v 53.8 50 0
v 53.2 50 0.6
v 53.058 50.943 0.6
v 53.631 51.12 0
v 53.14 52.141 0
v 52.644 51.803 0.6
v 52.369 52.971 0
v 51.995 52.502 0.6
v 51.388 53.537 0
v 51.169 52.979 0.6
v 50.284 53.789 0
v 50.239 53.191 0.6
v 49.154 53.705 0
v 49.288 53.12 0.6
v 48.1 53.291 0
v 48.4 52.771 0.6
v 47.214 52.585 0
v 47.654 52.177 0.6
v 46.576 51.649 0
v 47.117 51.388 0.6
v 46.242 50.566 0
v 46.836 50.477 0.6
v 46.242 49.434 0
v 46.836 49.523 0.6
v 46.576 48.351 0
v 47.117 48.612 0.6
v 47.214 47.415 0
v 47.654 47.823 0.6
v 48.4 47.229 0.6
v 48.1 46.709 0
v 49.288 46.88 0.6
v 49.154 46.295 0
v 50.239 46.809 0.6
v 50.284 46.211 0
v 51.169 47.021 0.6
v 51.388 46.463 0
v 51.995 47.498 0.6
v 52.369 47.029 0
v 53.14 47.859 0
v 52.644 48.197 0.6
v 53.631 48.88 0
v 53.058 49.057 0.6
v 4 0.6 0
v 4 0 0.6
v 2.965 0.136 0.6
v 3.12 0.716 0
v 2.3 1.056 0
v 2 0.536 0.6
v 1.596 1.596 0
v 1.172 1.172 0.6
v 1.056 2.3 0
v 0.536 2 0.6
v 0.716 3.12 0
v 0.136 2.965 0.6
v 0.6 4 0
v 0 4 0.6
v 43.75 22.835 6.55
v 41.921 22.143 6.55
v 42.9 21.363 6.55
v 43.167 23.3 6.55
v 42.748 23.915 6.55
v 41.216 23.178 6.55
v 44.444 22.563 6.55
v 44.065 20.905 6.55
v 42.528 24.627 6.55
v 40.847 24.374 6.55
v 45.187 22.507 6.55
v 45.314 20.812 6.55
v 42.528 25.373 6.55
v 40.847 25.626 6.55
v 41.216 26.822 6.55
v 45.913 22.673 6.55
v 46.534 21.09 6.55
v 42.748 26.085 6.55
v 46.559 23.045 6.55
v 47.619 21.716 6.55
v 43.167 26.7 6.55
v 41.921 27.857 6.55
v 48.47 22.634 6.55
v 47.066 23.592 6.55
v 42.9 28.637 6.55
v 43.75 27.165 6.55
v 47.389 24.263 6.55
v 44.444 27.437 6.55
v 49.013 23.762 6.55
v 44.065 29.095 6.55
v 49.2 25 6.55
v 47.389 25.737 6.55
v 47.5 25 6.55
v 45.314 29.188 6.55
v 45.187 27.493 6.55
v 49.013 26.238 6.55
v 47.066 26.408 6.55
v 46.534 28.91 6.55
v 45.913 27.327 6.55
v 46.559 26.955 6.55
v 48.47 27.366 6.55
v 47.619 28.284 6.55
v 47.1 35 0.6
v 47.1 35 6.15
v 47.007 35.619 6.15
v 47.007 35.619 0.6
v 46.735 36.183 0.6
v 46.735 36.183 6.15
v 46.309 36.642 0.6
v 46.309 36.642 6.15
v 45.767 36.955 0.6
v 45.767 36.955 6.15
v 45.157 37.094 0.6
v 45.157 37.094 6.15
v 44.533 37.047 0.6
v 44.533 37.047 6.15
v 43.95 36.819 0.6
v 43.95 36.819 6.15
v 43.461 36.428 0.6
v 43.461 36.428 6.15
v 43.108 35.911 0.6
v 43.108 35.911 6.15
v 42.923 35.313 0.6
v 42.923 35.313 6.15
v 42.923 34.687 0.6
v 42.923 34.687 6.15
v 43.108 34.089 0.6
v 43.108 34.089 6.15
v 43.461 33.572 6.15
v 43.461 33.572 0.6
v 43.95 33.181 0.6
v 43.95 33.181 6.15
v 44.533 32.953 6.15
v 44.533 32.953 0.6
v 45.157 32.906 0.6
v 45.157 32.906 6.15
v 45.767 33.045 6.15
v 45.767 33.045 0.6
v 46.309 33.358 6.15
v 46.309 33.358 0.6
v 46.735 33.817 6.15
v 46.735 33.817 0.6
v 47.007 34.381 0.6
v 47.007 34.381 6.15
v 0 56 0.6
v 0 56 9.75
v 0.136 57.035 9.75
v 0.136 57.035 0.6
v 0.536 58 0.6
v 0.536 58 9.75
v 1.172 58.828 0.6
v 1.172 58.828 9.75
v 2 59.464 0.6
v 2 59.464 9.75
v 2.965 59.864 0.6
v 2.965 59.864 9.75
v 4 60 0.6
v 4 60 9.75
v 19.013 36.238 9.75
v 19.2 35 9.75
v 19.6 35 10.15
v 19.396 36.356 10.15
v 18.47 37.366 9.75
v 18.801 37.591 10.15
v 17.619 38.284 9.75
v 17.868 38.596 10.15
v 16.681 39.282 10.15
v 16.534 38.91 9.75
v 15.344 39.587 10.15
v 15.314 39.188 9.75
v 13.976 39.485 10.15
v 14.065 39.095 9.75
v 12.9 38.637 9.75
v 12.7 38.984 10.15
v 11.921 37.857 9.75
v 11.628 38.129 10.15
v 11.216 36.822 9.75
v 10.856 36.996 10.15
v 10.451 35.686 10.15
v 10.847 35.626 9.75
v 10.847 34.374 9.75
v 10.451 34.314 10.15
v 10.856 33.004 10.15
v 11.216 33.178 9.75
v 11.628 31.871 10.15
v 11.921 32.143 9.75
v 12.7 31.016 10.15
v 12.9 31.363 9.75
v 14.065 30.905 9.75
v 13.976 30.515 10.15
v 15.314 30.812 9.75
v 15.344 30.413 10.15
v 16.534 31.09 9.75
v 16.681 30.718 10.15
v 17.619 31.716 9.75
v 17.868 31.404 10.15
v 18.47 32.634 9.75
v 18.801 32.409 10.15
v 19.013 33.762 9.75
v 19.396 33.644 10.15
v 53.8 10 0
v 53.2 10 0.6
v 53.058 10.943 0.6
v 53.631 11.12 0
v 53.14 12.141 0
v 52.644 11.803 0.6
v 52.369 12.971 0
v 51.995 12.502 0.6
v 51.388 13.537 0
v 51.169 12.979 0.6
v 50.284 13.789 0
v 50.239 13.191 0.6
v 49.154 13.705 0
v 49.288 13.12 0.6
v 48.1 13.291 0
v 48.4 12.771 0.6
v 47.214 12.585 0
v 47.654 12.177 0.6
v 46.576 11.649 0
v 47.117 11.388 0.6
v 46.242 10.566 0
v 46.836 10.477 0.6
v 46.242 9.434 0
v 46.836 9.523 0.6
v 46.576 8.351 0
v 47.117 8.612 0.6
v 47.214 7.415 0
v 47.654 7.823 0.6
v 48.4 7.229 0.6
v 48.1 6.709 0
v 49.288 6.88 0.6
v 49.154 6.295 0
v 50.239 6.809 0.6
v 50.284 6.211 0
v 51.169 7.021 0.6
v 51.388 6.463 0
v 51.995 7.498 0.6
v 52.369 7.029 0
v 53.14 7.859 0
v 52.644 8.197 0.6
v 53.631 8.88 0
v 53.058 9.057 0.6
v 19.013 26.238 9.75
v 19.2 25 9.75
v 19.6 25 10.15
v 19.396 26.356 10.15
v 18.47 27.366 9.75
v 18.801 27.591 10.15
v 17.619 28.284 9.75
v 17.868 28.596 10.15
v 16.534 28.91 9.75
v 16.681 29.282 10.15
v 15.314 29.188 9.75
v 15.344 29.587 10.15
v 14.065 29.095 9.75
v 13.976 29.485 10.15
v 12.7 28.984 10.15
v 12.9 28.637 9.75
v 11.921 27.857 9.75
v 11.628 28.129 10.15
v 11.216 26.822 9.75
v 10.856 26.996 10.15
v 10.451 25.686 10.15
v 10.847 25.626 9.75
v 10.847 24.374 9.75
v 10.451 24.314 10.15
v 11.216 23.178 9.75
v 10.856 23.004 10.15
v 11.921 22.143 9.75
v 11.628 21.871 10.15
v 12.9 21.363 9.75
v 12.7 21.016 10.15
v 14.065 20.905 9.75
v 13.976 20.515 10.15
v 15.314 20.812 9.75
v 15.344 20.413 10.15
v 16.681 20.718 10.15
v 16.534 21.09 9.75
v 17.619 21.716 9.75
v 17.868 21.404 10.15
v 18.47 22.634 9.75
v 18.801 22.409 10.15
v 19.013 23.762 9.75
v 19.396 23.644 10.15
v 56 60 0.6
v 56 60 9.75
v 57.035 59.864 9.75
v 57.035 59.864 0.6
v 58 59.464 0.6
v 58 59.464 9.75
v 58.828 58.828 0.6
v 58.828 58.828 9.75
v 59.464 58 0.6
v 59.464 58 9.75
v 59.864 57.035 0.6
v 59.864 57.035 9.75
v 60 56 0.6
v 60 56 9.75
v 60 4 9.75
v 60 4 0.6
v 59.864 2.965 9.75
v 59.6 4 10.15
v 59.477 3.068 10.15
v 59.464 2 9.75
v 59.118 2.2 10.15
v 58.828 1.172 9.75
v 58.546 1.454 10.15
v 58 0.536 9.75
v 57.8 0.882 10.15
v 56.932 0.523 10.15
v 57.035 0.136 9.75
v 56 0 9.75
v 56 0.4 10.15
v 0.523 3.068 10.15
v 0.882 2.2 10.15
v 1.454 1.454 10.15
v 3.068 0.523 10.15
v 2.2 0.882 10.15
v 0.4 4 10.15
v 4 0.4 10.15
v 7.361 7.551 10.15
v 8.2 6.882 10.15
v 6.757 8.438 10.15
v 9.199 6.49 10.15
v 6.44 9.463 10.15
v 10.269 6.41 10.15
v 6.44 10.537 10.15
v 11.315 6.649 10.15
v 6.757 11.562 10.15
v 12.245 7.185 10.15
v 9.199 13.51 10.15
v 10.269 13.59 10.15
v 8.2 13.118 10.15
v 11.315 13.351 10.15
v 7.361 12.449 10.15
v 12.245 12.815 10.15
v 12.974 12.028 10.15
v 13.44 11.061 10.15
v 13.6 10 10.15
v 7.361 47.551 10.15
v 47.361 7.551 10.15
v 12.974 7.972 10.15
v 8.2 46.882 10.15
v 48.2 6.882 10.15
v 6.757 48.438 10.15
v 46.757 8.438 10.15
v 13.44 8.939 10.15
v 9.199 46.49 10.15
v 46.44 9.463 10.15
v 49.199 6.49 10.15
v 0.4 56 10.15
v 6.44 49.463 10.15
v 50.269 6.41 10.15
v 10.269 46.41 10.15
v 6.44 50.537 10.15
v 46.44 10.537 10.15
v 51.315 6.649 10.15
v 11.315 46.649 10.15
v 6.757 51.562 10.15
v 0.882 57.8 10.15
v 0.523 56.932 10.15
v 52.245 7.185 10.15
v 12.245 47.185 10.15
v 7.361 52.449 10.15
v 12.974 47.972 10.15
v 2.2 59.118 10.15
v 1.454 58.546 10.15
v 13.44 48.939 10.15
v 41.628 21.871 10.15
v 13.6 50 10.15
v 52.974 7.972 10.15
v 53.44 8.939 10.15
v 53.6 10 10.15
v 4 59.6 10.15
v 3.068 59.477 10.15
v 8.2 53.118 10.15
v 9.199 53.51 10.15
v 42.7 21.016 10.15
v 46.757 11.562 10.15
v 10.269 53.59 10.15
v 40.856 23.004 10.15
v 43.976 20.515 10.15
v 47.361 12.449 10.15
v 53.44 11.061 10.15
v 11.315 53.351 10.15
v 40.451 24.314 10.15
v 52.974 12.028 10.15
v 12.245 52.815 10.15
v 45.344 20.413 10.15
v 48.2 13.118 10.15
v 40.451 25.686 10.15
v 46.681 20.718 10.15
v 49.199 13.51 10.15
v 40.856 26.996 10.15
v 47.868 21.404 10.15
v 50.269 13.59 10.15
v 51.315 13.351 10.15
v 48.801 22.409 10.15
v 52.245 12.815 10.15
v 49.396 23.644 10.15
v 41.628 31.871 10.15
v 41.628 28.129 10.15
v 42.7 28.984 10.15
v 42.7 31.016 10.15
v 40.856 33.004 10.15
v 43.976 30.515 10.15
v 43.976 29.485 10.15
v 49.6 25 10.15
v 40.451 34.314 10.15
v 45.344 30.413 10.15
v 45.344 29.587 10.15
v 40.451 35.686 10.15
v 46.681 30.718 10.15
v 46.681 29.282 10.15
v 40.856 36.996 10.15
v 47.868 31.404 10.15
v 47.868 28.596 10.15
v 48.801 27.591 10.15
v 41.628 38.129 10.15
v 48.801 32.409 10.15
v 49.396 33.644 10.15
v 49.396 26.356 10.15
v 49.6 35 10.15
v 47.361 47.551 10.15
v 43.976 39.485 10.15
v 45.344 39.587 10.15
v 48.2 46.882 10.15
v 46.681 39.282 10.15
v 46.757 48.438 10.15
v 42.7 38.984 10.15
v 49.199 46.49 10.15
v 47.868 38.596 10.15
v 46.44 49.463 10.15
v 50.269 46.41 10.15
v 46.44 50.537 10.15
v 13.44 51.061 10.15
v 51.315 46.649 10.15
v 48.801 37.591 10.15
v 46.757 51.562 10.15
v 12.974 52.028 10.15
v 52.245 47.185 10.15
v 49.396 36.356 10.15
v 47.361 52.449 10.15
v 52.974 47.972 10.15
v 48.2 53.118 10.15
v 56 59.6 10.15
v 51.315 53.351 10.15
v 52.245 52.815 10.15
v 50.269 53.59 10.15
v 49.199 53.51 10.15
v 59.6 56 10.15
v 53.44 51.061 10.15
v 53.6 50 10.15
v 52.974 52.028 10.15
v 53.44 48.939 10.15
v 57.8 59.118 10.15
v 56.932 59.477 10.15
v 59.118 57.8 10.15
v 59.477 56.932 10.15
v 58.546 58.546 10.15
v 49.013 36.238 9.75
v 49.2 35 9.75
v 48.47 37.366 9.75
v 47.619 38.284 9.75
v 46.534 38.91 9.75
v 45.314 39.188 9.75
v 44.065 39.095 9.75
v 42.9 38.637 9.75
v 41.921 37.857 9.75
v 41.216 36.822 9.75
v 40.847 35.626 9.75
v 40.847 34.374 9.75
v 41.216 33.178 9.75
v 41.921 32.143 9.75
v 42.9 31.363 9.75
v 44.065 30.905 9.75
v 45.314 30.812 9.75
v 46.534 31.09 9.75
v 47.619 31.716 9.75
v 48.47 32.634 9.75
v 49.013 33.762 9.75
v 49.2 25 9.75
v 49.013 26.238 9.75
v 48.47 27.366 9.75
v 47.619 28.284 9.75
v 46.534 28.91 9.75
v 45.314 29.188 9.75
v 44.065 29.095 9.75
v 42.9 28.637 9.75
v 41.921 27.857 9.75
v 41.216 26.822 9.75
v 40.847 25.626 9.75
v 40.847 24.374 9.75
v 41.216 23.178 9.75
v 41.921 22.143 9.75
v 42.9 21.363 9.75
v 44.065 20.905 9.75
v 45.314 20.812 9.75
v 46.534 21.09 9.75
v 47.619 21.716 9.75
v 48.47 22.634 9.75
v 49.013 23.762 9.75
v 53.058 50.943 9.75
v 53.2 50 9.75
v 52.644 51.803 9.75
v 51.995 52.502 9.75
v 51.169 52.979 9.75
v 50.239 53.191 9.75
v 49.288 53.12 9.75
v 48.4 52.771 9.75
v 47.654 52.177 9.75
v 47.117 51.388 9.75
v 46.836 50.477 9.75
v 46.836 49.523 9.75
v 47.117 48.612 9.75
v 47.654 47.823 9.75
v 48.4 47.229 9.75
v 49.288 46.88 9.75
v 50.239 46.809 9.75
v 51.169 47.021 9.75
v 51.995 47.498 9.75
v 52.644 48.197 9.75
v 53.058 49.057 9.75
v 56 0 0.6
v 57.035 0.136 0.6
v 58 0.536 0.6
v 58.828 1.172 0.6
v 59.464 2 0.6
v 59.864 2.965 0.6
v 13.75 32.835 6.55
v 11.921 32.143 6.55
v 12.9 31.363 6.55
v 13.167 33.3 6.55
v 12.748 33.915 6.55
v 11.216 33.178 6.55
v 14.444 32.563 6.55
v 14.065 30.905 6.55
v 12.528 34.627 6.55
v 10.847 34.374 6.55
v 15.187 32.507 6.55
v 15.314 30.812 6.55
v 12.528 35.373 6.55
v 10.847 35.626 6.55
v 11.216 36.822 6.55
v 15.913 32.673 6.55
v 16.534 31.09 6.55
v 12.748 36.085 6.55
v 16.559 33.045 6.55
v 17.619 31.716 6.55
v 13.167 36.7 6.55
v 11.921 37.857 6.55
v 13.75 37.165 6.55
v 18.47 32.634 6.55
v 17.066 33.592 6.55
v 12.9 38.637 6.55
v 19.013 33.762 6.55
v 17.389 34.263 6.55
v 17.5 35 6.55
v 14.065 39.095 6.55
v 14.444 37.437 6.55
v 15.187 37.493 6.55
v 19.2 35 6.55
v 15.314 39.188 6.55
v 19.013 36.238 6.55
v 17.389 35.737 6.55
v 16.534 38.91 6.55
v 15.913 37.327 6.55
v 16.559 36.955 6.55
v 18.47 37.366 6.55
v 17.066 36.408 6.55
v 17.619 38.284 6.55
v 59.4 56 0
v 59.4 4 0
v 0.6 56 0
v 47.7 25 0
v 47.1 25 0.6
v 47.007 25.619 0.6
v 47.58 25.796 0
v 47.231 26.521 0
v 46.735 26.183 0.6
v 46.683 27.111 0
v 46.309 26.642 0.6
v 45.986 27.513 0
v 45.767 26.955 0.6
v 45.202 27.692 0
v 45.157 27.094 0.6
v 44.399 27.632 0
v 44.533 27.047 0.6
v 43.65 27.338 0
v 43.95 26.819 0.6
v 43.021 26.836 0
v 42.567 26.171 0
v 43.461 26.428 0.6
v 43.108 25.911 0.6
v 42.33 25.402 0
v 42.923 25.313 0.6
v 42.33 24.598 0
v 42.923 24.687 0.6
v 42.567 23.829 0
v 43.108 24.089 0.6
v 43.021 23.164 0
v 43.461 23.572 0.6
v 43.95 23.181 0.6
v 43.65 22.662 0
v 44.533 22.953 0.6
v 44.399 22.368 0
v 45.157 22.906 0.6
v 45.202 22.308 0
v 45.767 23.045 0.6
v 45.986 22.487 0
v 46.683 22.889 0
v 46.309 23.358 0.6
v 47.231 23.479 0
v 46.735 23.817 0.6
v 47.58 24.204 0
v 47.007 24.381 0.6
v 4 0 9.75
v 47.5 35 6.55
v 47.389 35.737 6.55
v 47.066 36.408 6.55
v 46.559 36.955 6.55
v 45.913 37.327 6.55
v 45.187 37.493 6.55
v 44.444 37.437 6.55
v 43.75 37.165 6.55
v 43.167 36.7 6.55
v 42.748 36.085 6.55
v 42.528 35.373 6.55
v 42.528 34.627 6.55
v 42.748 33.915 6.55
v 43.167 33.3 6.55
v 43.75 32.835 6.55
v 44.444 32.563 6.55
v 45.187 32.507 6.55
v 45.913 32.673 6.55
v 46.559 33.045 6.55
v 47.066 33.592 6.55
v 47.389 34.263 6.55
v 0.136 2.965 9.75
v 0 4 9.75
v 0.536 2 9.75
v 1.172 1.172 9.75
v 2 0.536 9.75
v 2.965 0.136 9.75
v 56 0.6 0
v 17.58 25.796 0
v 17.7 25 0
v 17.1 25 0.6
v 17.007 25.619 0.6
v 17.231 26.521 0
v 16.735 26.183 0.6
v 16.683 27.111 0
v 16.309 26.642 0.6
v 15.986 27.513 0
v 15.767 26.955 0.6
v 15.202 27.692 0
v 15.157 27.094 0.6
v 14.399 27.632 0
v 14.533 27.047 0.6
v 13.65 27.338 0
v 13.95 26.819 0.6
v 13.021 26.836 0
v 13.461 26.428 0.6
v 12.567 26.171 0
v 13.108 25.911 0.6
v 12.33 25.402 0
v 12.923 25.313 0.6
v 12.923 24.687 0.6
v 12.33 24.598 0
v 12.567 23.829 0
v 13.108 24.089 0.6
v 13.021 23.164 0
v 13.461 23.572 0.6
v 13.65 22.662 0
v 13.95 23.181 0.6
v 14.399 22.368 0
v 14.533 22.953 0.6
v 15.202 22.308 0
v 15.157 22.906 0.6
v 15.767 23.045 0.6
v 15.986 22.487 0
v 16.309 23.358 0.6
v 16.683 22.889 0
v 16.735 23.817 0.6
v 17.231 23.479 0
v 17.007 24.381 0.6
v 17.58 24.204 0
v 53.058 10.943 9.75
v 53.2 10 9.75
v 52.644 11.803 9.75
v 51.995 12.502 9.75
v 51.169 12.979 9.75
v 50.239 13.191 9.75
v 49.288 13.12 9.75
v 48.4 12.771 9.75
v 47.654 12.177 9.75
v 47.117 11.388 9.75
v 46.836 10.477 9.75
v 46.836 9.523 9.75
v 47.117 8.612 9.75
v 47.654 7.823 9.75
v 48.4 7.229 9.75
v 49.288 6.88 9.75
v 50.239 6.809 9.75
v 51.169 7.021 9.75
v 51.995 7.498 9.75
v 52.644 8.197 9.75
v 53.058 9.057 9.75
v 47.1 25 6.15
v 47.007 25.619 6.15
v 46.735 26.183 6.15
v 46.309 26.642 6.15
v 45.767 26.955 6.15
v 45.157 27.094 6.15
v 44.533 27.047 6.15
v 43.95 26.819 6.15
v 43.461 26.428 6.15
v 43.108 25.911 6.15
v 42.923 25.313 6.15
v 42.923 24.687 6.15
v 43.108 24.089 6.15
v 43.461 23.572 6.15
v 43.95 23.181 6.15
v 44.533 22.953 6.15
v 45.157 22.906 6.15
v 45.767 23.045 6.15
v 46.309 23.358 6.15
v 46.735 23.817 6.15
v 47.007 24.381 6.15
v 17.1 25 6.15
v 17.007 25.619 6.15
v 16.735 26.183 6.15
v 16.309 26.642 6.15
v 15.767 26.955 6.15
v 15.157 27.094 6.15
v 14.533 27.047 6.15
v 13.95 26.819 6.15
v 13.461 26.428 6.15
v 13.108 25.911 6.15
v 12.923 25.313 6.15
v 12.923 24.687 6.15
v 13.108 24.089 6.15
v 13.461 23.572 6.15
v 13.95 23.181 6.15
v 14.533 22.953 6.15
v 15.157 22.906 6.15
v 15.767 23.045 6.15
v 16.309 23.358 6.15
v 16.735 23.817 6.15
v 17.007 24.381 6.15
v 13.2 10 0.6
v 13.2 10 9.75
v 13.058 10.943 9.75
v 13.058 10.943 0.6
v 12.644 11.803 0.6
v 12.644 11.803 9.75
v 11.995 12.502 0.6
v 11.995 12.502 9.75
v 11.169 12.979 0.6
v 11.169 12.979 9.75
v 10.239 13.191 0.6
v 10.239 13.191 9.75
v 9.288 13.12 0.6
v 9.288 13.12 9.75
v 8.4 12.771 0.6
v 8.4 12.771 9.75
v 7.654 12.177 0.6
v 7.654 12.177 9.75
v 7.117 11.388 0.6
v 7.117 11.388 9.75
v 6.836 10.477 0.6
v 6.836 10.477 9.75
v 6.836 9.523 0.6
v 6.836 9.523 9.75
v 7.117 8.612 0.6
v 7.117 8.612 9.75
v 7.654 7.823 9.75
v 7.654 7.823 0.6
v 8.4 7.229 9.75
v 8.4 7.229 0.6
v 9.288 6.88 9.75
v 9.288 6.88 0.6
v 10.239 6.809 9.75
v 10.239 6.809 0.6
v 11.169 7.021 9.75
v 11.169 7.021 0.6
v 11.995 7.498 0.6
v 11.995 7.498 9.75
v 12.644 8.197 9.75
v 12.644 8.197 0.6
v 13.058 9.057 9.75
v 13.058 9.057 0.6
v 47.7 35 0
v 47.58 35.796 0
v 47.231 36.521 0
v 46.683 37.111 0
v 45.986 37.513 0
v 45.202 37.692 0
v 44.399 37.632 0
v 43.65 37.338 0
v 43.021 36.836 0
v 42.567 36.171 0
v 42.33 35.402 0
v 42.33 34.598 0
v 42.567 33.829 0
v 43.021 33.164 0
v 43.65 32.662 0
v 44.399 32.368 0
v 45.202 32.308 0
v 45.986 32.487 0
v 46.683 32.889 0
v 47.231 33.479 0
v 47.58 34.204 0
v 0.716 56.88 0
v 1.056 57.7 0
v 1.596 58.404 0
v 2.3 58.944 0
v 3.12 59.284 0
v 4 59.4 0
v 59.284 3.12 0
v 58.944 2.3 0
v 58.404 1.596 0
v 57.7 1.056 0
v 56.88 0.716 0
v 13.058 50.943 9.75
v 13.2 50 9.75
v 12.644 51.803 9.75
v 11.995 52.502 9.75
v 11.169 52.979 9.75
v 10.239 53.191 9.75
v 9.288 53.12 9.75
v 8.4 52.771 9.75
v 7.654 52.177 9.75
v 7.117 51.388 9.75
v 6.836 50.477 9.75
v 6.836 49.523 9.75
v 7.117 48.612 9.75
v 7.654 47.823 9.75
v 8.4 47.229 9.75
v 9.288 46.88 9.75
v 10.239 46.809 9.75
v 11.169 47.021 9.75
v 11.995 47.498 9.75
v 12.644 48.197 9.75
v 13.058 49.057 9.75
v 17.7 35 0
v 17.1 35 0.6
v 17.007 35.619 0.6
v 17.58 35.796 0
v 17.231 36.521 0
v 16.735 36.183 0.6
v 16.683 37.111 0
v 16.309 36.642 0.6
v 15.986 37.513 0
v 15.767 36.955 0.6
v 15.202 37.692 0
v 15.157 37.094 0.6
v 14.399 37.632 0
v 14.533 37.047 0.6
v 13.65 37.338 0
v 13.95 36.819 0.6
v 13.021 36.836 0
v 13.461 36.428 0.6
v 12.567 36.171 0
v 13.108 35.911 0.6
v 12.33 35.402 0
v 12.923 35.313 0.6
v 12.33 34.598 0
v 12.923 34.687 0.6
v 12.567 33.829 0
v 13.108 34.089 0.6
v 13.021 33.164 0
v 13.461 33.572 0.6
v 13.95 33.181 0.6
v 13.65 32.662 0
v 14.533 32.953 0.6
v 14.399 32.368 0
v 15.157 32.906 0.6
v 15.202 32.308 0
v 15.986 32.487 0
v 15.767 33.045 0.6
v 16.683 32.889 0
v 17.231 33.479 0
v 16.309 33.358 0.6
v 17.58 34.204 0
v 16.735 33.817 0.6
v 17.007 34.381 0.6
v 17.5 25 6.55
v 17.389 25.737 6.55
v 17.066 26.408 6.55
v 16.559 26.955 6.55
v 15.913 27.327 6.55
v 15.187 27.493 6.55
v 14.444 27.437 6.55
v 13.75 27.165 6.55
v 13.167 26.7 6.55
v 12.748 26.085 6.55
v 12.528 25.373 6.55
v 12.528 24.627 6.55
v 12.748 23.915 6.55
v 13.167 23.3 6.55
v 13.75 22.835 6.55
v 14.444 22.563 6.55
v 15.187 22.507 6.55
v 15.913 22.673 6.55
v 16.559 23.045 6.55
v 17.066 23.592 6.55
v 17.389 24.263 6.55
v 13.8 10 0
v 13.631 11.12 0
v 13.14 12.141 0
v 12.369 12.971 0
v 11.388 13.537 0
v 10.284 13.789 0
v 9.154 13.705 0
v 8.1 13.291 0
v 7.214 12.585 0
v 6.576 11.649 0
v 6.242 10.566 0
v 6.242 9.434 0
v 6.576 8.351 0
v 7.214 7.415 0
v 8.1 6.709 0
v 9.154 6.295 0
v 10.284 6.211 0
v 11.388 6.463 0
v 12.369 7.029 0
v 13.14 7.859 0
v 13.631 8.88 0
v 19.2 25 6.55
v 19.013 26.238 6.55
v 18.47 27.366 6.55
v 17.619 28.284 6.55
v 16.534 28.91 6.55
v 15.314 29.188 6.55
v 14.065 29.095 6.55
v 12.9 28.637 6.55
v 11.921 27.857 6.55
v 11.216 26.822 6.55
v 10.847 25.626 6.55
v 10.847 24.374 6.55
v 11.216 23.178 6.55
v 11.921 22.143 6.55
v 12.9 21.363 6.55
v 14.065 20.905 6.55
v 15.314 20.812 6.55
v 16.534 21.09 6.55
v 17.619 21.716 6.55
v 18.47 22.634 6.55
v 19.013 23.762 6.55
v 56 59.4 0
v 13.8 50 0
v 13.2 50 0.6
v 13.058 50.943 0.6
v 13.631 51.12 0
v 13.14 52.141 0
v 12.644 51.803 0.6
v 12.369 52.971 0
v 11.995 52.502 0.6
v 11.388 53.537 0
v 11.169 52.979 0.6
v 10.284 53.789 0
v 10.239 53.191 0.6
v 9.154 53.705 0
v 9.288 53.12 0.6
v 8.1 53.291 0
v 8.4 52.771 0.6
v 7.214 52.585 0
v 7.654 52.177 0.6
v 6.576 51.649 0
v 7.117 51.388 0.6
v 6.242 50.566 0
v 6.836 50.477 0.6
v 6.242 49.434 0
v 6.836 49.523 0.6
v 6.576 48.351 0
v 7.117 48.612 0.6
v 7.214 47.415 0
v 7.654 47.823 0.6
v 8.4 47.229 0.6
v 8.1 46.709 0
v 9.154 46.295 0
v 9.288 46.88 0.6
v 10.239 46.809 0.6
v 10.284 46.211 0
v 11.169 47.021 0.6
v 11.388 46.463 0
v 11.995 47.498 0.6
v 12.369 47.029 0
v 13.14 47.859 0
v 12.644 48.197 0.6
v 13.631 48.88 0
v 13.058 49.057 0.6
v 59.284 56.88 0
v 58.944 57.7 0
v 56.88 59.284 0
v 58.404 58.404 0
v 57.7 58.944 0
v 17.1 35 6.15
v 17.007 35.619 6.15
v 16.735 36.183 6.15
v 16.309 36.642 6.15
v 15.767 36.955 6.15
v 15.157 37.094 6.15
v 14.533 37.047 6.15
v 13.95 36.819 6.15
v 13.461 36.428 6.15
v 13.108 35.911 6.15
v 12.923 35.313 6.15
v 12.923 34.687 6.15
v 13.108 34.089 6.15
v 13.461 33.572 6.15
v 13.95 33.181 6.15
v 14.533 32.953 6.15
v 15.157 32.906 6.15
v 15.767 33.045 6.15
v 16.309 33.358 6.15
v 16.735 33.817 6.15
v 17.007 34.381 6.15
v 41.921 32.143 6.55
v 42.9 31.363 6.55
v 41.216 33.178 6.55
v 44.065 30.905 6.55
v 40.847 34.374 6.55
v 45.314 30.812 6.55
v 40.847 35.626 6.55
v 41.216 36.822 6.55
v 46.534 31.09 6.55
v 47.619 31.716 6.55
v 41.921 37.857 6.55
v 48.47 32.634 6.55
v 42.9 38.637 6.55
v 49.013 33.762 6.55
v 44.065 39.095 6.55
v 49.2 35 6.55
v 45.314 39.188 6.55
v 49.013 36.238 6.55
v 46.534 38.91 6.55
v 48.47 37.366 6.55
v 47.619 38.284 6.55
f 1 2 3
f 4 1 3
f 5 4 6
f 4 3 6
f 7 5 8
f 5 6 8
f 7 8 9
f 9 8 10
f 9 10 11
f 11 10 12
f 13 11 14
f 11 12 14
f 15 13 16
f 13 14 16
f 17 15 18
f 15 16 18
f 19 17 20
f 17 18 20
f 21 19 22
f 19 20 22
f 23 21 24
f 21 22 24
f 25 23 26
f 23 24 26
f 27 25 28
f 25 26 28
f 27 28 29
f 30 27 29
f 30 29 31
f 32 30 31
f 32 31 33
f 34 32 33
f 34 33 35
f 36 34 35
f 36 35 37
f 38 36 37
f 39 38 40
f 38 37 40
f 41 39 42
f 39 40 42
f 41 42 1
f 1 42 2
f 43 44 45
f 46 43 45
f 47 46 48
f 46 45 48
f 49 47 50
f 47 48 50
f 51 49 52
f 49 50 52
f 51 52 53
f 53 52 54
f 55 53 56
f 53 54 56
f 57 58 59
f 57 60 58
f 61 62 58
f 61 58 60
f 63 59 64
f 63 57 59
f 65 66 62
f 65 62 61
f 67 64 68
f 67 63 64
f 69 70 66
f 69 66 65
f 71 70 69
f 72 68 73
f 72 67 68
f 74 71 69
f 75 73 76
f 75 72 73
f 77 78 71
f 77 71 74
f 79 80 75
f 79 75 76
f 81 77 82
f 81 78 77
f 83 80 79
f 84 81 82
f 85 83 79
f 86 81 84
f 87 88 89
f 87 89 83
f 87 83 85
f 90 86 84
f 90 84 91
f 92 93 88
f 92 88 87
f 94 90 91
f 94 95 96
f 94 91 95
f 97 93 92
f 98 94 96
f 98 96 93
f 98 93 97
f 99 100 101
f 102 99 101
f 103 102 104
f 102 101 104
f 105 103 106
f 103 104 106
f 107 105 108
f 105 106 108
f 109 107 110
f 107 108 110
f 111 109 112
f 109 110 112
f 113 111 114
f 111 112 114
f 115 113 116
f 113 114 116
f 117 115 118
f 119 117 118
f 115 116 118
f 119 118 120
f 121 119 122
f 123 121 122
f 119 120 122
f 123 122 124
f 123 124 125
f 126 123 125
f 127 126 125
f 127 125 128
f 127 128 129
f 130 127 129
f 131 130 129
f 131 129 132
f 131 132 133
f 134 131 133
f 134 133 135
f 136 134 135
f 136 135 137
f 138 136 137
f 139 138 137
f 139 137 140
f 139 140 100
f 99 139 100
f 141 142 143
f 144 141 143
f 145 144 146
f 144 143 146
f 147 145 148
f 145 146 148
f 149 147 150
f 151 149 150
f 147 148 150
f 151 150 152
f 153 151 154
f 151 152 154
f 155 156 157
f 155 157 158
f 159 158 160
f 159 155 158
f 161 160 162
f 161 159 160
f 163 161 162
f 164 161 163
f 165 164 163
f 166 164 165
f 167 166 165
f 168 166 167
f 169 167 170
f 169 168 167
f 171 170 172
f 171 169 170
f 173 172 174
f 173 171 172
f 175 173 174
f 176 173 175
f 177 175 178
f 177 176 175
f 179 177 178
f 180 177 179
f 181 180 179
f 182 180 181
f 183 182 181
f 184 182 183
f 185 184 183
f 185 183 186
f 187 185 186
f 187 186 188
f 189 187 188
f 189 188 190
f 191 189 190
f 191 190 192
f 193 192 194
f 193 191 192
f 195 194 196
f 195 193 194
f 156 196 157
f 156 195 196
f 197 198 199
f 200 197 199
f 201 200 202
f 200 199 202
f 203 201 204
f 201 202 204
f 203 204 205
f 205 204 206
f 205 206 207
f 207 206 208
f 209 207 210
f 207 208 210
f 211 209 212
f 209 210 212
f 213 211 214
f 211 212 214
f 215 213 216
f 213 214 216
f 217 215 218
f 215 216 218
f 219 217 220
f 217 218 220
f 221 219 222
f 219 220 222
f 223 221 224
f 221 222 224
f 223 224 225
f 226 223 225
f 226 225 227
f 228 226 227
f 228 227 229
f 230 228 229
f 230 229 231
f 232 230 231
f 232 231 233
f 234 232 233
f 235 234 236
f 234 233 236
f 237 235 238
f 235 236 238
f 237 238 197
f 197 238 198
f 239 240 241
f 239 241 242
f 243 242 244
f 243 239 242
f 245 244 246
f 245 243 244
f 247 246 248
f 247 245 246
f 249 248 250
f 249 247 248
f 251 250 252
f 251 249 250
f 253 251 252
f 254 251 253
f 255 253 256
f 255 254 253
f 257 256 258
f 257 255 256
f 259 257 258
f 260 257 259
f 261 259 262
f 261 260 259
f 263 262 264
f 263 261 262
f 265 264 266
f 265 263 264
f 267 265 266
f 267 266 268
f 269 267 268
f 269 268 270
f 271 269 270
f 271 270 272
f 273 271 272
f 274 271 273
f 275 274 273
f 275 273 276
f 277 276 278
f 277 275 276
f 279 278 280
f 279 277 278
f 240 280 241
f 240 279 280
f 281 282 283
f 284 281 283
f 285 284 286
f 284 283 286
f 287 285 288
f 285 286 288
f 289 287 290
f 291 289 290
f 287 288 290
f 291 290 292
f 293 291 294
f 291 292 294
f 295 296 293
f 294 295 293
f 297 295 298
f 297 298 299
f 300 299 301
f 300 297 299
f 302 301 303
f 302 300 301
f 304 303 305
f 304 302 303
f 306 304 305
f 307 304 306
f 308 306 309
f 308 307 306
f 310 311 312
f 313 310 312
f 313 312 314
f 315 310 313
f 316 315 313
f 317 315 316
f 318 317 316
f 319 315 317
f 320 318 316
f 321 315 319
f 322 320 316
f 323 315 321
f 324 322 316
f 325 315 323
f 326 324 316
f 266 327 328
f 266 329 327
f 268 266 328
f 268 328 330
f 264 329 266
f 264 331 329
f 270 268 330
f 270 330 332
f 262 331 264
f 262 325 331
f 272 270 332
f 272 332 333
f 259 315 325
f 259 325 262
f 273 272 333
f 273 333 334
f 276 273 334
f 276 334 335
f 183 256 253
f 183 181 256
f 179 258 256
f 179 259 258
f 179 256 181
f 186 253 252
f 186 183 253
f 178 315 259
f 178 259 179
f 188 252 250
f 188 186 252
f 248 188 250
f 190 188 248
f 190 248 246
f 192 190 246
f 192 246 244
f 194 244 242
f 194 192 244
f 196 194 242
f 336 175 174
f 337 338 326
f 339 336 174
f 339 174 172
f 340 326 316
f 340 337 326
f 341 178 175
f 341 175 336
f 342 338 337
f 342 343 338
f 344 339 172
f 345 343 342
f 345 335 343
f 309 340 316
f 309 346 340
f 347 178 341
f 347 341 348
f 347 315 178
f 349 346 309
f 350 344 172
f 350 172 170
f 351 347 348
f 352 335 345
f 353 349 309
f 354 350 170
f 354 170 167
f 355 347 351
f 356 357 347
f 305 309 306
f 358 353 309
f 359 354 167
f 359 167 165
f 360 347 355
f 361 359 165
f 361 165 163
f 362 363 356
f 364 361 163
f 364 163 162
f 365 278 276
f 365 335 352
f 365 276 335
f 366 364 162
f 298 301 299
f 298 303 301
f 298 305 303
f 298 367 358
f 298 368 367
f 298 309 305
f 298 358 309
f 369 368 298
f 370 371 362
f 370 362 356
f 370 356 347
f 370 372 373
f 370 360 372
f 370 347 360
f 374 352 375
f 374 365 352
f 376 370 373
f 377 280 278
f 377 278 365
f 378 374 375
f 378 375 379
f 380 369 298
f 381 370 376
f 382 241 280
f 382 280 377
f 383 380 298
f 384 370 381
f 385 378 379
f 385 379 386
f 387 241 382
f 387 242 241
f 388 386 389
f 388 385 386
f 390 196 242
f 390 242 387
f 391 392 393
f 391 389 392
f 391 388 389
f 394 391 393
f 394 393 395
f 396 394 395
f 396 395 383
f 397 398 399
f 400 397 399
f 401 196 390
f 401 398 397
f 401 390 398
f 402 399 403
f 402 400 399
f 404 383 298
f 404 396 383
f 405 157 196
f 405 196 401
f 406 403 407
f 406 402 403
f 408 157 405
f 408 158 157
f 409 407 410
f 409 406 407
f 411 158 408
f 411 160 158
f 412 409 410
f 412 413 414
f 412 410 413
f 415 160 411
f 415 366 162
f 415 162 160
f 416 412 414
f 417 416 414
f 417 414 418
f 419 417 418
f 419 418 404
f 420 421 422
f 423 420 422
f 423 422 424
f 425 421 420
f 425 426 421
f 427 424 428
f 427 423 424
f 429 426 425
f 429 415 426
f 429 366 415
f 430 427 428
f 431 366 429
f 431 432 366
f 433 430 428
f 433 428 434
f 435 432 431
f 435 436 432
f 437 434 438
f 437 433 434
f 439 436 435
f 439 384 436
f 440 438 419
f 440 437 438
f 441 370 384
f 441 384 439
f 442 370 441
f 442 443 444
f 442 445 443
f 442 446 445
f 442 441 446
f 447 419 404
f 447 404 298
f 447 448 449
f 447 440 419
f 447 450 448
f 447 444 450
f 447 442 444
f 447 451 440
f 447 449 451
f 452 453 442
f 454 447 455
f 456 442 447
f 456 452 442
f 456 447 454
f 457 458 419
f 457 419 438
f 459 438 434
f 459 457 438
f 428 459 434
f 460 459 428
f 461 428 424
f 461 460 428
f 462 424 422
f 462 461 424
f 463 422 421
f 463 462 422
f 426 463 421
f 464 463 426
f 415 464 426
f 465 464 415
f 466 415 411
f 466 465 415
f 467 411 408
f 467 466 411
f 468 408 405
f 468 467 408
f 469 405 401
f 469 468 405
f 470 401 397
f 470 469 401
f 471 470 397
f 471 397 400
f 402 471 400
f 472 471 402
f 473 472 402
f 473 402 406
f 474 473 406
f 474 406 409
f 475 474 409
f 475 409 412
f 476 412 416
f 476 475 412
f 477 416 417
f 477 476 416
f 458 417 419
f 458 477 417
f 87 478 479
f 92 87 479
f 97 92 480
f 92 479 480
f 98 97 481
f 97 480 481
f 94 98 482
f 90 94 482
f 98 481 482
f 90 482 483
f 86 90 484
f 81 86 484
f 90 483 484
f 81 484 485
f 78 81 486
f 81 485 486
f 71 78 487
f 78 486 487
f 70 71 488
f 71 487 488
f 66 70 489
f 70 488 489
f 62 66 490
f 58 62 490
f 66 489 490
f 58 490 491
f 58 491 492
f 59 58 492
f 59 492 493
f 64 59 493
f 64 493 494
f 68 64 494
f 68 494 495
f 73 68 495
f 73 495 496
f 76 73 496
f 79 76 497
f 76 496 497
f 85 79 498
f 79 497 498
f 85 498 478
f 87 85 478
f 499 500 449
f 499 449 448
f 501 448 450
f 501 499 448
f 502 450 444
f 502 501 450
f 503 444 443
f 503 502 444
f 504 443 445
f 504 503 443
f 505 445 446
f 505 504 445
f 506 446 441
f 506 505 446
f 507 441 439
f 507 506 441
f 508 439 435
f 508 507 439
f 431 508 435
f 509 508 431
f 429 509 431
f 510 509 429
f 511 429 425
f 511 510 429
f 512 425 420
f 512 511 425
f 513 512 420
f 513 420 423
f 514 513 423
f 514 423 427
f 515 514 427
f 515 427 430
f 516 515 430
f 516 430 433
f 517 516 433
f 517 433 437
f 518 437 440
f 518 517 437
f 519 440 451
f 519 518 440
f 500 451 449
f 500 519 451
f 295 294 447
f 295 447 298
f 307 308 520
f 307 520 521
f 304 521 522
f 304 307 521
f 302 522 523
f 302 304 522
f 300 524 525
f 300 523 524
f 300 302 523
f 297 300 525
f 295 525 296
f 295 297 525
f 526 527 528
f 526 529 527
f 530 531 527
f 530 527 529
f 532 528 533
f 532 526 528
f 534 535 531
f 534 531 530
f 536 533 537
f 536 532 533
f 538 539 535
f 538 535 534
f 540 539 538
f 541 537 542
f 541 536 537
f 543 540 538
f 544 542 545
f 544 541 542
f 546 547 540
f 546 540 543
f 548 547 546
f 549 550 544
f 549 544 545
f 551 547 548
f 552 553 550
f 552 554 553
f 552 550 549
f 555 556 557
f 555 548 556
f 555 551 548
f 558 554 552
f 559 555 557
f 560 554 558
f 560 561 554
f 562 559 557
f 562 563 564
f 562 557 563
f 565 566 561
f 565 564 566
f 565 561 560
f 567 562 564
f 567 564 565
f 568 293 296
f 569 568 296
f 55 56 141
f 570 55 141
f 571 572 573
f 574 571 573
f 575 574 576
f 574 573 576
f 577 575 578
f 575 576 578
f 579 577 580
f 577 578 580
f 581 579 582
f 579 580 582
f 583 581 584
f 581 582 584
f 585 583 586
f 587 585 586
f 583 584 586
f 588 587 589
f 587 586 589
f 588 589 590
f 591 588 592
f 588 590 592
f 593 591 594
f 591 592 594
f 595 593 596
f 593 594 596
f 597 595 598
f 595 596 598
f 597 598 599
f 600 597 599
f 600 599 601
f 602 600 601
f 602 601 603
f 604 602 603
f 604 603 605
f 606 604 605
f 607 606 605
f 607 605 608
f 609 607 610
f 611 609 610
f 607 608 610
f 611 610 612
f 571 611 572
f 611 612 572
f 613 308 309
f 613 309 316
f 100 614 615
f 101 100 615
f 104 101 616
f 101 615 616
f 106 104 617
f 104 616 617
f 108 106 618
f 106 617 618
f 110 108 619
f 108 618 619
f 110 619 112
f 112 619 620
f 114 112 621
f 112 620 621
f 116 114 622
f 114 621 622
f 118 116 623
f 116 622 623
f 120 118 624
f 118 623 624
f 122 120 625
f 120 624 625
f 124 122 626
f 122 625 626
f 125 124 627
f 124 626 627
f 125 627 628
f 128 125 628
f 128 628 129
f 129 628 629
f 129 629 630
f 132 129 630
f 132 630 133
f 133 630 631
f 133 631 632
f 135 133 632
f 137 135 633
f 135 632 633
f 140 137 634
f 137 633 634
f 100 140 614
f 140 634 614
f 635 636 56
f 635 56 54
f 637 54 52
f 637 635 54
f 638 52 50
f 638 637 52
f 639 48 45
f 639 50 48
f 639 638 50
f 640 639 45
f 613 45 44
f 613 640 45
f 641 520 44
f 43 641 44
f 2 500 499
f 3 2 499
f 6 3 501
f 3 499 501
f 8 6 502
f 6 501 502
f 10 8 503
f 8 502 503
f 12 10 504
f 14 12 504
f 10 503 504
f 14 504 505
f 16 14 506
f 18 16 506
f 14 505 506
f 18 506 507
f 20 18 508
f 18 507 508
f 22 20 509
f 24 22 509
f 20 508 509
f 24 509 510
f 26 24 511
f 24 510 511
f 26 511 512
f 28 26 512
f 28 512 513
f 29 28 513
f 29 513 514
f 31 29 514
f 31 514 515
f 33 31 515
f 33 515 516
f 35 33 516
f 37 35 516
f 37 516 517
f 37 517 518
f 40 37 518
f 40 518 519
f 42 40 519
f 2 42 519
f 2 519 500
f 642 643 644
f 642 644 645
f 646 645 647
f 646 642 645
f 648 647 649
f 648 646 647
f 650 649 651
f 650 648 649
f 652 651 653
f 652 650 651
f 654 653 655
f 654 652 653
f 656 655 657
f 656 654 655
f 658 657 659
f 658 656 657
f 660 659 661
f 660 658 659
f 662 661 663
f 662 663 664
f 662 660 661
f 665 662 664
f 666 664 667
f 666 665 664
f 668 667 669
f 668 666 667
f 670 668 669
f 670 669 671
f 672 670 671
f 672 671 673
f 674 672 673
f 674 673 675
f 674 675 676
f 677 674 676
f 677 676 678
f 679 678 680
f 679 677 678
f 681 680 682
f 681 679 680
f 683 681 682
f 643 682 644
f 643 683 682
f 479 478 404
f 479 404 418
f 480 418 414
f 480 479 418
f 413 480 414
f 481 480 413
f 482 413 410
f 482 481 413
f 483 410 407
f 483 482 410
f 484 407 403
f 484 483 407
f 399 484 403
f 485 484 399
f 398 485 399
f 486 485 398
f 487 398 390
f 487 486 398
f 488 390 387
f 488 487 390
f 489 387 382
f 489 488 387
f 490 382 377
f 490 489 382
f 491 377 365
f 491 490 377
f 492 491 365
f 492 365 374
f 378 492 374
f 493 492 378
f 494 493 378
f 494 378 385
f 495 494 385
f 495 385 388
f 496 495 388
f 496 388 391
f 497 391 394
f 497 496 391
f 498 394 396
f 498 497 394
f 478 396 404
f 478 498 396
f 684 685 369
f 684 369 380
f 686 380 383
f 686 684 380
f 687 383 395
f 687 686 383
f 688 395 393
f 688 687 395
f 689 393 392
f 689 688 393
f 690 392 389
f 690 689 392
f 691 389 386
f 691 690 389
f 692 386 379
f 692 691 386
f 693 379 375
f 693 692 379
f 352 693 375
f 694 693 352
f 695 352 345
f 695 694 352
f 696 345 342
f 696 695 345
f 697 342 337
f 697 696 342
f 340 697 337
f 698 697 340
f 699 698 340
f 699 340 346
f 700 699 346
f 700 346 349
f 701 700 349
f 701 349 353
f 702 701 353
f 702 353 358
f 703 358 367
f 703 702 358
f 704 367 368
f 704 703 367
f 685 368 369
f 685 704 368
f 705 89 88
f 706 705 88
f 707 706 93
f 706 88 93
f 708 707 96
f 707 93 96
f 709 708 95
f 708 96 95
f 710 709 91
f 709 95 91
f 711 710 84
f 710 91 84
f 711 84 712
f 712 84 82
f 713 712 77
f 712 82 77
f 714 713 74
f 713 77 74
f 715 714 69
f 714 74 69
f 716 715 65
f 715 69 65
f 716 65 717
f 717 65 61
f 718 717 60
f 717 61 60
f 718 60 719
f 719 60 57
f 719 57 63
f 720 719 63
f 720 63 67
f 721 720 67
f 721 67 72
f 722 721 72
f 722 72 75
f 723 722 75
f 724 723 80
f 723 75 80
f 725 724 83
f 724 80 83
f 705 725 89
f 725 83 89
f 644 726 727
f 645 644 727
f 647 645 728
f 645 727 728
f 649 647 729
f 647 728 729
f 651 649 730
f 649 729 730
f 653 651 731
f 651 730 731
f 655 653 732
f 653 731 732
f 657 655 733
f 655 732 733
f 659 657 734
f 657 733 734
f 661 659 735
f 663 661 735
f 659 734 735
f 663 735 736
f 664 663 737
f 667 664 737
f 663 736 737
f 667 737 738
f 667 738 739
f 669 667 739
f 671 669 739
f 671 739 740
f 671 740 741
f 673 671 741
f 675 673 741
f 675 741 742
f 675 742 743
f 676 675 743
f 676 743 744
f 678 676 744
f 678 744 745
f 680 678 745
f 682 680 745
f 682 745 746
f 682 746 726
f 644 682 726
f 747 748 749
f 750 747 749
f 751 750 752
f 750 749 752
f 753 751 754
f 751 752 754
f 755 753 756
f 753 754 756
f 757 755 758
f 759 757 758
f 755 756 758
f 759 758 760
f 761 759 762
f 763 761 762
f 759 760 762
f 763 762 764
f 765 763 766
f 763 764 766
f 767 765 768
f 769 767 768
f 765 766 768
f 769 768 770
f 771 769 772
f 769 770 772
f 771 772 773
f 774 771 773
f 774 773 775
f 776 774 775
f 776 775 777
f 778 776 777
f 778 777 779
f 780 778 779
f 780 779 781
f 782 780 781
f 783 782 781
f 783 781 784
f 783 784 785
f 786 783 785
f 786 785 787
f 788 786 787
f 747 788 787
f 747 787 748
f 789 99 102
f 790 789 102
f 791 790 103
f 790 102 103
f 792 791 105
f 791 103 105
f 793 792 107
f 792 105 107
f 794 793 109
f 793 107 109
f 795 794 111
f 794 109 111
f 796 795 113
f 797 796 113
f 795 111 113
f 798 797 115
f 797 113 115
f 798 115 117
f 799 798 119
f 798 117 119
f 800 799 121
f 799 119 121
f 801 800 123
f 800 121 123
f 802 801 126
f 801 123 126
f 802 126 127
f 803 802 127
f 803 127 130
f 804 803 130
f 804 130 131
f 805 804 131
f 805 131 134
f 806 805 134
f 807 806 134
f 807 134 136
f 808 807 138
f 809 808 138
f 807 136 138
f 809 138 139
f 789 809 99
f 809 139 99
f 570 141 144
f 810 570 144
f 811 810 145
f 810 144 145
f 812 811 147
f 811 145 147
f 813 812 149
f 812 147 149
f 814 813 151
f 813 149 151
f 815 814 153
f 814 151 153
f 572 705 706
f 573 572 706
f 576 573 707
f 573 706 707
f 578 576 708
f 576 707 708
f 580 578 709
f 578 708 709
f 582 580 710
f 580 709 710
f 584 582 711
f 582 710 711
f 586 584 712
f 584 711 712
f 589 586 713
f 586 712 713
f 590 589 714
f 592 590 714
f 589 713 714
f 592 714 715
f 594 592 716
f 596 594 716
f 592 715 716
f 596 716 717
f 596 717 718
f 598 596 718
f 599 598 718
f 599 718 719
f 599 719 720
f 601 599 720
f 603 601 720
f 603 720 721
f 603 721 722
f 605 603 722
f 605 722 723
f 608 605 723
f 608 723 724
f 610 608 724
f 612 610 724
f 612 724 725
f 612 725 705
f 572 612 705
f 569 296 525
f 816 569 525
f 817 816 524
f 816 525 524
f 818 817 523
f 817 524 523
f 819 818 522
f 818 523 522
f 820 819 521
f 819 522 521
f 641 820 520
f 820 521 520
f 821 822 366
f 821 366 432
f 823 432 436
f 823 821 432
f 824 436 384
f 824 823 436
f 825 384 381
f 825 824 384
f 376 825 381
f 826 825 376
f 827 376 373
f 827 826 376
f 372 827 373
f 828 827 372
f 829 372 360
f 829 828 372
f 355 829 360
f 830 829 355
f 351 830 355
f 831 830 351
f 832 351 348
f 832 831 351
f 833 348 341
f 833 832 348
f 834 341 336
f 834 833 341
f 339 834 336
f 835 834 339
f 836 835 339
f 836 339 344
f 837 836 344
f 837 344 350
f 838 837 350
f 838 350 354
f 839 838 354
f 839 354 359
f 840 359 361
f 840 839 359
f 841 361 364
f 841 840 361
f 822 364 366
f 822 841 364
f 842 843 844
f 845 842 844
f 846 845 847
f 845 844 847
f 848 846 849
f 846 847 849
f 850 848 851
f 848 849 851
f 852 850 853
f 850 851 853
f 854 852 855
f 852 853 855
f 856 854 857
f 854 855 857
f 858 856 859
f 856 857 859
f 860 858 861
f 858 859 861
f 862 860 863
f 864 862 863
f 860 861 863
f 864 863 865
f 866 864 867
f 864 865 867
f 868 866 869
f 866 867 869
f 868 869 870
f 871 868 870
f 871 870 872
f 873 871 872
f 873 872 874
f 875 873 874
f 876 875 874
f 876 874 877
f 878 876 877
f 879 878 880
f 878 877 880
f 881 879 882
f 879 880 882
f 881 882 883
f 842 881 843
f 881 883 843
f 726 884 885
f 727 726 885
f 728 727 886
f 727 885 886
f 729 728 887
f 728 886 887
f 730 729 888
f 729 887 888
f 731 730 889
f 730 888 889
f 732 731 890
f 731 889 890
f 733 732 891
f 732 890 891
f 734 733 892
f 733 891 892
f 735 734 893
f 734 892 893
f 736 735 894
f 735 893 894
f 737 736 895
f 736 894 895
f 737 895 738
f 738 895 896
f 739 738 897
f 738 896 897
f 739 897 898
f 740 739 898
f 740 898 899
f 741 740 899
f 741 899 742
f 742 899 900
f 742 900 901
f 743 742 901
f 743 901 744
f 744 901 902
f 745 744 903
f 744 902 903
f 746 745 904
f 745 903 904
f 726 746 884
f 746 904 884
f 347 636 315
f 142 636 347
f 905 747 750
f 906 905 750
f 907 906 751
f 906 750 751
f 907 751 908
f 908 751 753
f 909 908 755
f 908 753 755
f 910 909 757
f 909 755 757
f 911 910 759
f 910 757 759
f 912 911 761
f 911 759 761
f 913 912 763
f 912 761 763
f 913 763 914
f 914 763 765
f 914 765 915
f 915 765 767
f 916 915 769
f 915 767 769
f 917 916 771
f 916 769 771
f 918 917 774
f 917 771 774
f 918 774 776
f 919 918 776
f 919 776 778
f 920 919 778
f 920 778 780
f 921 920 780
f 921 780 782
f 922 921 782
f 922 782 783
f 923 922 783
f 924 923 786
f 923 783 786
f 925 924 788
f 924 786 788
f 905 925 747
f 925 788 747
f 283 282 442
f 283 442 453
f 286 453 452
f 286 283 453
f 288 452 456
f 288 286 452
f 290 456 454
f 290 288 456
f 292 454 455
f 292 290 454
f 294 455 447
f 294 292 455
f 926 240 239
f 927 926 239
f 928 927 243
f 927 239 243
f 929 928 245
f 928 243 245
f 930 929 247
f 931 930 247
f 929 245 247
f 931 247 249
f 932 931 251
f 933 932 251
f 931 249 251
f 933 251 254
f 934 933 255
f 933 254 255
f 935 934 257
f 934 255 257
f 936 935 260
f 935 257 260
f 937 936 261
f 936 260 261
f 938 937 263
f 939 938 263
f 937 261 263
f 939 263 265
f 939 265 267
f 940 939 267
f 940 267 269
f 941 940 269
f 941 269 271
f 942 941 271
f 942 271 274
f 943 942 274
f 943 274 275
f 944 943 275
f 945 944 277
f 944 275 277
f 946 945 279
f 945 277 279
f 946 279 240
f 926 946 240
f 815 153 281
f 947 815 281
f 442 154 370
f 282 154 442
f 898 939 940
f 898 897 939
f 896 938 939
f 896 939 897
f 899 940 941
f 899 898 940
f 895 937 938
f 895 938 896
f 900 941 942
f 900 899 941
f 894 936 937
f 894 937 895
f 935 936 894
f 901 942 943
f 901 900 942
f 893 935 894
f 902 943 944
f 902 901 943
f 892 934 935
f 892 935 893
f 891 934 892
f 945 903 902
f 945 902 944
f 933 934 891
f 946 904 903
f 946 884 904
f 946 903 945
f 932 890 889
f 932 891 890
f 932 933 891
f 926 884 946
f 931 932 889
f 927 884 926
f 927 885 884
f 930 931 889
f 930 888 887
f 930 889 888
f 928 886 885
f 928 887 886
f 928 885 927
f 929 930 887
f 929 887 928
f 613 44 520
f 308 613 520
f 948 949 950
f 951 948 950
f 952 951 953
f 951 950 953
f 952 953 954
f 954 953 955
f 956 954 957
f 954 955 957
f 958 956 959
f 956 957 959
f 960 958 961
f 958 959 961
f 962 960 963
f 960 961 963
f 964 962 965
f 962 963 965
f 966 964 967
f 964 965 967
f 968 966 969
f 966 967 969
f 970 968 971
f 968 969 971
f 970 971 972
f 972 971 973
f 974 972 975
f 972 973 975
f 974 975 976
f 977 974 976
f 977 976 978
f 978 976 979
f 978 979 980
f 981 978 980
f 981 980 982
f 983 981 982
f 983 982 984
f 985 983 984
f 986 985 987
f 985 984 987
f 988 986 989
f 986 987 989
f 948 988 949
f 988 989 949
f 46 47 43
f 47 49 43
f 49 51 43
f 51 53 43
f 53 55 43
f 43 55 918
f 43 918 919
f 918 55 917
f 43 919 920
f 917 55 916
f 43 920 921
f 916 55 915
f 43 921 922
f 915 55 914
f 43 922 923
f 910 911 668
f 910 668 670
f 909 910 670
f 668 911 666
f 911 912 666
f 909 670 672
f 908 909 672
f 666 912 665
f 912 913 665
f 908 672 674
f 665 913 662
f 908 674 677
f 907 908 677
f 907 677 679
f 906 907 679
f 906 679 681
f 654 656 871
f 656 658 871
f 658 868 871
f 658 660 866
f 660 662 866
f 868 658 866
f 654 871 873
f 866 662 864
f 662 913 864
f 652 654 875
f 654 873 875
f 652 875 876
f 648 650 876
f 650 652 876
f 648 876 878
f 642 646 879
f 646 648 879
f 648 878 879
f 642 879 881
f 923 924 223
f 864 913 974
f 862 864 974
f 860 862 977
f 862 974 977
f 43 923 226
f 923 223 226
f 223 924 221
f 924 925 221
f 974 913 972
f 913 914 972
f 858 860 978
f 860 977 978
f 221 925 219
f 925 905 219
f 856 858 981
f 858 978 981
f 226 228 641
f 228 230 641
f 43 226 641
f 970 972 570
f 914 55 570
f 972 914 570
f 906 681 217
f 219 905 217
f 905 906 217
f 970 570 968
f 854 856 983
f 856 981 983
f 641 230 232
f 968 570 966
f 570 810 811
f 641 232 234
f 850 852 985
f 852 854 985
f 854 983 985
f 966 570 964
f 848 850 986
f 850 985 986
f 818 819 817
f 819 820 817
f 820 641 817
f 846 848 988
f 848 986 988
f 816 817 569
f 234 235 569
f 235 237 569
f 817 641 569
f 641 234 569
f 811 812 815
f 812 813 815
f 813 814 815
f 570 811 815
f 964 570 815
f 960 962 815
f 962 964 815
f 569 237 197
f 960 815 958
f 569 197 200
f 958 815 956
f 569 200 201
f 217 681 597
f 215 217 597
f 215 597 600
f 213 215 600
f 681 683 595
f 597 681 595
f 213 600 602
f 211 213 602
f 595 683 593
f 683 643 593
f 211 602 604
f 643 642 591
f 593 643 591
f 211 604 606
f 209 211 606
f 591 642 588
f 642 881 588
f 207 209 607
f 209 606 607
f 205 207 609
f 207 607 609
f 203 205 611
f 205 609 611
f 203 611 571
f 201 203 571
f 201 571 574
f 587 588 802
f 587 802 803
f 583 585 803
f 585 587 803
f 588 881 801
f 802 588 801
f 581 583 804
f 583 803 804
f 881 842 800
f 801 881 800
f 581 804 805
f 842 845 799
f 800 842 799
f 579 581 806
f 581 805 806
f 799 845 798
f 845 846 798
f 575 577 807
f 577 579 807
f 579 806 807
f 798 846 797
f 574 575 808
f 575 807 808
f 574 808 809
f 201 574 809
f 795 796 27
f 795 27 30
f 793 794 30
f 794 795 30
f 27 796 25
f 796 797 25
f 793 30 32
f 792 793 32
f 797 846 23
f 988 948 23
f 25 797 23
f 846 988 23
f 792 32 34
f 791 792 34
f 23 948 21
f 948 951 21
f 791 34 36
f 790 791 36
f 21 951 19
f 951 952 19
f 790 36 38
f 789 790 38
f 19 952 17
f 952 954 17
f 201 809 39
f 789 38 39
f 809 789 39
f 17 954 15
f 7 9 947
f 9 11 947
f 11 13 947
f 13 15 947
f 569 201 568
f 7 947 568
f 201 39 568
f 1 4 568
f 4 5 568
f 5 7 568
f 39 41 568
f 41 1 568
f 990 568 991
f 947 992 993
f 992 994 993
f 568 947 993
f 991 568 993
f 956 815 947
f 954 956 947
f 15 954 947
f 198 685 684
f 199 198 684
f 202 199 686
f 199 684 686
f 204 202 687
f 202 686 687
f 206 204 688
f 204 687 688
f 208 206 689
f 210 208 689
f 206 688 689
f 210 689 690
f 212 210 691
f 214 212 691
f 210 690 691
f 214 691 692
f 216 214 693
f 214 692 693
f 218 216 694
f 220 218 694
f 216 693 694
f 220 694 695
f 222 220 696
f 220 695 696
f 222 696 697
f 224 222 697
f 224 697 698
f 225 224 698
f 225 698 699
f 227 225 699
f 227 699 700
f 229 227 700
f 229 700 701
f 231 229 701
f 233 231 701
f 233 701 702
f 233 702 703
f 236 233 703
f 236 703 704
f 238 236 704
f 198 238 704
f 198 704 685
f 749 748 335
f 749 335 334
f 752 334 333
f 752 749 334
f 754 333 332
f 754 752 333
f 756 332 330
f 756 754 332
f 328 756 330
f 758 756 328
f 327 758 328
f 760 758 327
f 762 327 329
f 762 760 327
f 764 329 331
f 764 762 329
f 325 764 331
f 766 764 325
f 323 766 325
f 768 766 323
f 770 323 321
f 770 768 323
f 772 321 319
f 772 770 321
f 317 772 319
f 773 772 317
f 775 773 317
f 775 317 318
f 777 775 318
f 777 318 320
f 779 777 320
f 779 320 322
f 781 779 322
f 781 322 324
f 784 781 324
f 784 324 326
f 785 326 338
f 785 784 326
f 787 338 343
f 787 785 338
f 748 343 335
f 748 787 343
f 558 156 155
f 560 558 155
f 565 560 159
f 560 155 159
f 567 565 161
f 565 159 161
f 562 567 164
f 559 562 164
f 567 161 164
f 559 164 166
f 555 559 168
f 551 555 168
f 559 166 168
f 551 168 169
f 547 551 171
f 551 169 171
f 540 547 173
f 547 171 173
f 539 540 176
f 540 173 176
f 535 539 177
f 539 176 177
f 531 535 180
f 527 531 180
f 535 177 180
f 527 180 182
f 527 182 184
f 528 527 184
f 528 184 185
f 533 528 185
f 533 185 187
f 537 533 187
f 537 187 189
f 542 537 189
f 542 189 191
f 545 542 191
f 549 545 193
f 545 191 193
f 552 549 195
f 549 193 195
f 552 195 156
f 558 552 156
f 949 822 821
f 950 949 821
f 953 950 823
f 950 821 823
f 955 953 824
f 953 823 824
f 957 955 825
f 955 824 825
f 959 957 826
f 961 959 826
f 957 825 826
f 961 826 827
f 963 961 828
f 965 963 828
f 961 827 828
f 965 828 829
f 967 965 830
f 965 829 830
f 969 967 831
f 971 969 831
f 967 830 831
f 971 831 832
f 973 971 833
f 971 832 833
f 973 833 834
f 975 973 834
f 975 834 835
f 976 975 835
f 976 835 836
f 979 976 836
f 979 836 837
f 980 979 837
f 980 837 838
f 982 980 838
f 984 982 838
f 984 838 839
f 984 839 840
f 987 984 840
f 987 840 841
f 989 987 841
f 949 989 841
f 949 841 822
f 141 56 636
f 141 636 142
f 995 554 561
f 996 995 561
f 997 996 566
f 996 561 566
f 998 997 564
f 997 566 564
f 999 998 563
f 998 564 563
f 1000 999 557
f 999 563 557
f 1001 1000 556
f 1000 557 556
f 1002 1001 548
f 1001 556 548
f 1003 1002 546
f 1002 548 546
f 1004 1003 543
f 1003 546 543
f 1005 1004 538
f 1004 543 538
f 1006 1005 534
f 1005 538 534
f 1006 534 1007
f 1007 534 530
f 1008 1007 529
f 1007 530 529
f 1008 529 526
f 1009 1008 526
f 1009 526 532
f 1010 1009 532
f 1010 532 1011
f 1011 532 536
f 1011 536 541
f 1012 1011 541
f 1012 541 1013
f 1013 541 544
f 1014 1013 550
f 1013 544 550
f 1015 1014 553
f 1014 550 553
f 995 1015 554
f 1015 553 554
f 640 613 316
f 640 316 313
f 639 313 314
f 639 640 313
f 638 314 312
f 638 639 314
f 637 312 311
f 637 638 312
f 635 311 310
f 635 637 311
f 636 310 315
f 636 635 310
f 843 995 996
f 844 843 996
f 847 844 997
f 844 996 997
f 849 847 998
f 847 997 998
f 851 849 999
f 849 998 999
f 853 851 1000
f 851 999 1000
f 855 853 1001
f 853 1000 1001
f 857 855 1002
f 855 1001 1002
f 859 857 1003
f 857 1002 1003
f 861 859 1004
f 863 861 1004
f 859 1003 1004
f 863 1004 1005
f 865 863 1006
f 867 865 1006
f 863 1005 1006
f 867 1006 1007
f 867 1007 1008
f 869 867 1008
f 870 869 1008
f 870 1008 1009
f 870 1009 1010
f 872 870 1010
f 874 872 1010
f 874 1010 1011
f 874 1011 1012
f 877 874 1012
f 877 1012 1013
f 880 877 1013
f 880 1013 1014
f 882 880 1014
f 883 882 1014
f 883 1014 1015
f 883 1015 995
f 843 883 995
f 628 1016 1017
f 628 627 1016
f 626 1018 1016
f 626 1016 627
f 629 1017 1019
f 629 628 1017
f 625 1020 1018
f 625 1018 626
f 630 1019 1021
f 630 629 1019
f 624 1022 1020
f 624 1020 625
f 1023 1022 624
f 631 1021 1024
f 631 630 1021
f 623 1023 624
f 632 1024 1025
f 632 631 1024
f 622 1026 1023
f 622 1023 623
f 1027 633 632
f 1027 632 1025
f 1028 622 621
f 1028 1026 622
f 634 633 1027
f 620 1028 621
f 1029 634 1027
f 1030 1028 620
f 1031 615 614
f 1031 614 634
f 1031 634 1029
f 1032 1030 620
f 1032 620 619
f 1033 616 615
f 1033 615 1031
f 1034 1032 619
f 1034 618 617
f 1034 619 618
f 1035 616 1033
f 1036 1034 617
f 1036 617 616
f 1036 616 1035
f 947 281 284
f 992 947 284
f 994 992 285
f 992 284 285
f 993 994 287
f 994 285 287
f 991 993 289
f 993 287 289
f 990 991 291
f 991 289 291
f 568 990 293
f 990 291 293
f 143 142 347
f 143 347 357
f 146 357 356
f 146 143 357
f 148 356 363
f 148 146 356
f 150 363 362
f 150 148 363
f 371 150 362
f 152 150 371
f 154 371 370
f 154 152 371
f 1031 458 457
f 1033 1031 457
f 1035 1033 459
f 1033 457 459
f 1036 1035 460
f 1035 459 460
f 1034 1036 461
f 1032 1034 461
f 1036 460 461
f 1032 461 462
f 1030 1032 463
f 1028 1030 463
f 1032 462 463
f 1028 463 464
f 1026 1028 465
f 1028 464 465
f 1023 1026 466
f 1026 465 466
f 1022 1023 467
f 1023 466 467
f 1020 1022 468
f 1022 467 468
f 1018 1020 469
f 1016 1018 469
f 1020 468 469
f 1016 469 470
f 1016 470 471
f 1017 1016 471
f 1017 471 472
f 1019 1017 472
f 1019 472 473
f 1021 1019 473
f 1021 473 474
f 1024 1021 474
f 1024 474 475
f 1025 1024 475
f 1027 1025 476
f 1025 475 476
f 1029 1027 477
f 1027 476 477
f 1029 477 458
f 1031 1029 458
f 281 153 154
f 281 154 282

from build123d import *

# Parameters (mm, degrees)
SKETCH_W        = 60
SKETCH_H        = 60
PAD_DEPTH       = 10.15
SKETCH001_R     = 2.1
SKETCH001_R_2   = 3.2
POCKET_DEPTH    = 12
SKETCH002_R     = 4.2
POCKET001_DEPTH = 3.6
FILLET_R        = 4
CHAMFER_SIZE    = 0.4
CHAMFER001_SIZE = 0.4
CHAMFER002_SIZE = 0.6


with BuildPart() as part:
    # Sketch → Pad (new body)
    with BuildSketch(Plane.XY):
        with Locations((30, 30)):
            Rectangle(SKETCH_W, SKETCH_H)
    extrude(amount=PAD_DEPTH)

    # Sketch001 (on Face6 of Pad) → Pocket (cut)
    with BuildSketch(Plane.XY.offset(10.15)):
        with Locations((15, 35)):
            Circle(SKETCH001_R)
        with Locations((45, 35)):
            Circle(SKETCH001_R)
        with Locations((15, 25)):
            Circle(SKETCH001_R)
        with Locations((45, 25)):
            Circle(SKETCH001_R)
        with Locations((10, 50)):
            Circle(SKETCH001_R_2)
        with Locations((50, 50)):
            Circle(SKETCH001_R_2)
        with Locations((10, 10)):
            Circle(SKETCH001_R_2)
        with Locations((50, 10)):
            Circle(SKETCH001_R_2)
    extrude(amount=-POCKET_DEPTH, mode=Mode.SUBTRACT)

    # Sketch002 (on Face5 of Pocket) → Pocket001 (cut)
    with BuildSketch(Plane.XY.offset(10.15)):
        with Locations((15, 35)):
            Circle(SKETCH002_R)
        with Locations((45, 35)):
            Circle(SKETCH002_R)
        with Locations((45, 25)):
            Circle(SKETCH002_R)
        with Locations((15, 25)):
            Circle(SKETCH002_R)
    extrude(amount=-POCKET001_DEPTH, mode=Mode.SUBTRACT)

    # Fillet
    fillet_edges = [part.edges().sort_by_distance(p)[0] for p in [
        (60, 0, 5.075),
        (0, 0, 5.075),
        (0, 60, 5.075),
        (60, 60, 5.075),
    ]]
    fillet(fillet_edges, radius=FILLET_R)

    # Chamfer
    chamfer_edges = [part.edges().sort_by_distance(p)[0] for p in [
        (30, 60, 10.15),
        (1.171573, 58.828427, 10.15),
        (58.828427, 58.828427, 10.15),
        (0, 30, 10.15),
        (60, 30, 10.15),
        (1.171573, 1.171573, 10.15),
        (58.828427, 1.171573, 10.15),
        (30, 0, 10.15),
        (40.8, 35, 10.15),
        (46.8, 50, 10.15),
        (6.8, 50, 10.15),
        (10.8, 35, 10.15),
        (10.8, 25, 10.15),
        (40.8, 25, 10.15),
        (46.8, 10, 10.15),
        (6.8, 10, 10.15),
    ]]
    chamfer(chamfer_edges, length=CHAMFER_SIZE)

    # Chamfer001
    chamfer001_edges = [part.edges().sort_by_distance(p)[0] for p in [
        (42.9, 35, 6.55),
        (42.9, 25, 6.55),
        (12.9, 25, 6.55),
        (12.9, 35, 6.55),
    ]]
    chamfer(chamfer001_edges, length=CHAMFER001_SIZE)

    # Chamfer002
    chamfer002_edges = [part.edges().sort_by_distance(p)[0] for p in [
        (30, 60, 0),
        (1.171573, 58.828427, 0),
        (58.828427, 58.828427, 0),
        (0, 30, 0),
        (60, 30, 0),
        (1.171573, 1.171573, 0),
        (58.828427, 1.171573, 0),
        (30, 0, 0),
        (42.9, 25, 0),
        (42.9, 35, 0),
        (46.8, 50, 0),
        (6.8, 50, 0),
        (12.9, 25, 0),
        (12.9, 35, 0),
        (46.8, 10, 0),
        (6.8, 10, 0),
    ]]
    chamfer(chamfer002_edges, length=CHAMFER002_SIZE)


solid = part.part
